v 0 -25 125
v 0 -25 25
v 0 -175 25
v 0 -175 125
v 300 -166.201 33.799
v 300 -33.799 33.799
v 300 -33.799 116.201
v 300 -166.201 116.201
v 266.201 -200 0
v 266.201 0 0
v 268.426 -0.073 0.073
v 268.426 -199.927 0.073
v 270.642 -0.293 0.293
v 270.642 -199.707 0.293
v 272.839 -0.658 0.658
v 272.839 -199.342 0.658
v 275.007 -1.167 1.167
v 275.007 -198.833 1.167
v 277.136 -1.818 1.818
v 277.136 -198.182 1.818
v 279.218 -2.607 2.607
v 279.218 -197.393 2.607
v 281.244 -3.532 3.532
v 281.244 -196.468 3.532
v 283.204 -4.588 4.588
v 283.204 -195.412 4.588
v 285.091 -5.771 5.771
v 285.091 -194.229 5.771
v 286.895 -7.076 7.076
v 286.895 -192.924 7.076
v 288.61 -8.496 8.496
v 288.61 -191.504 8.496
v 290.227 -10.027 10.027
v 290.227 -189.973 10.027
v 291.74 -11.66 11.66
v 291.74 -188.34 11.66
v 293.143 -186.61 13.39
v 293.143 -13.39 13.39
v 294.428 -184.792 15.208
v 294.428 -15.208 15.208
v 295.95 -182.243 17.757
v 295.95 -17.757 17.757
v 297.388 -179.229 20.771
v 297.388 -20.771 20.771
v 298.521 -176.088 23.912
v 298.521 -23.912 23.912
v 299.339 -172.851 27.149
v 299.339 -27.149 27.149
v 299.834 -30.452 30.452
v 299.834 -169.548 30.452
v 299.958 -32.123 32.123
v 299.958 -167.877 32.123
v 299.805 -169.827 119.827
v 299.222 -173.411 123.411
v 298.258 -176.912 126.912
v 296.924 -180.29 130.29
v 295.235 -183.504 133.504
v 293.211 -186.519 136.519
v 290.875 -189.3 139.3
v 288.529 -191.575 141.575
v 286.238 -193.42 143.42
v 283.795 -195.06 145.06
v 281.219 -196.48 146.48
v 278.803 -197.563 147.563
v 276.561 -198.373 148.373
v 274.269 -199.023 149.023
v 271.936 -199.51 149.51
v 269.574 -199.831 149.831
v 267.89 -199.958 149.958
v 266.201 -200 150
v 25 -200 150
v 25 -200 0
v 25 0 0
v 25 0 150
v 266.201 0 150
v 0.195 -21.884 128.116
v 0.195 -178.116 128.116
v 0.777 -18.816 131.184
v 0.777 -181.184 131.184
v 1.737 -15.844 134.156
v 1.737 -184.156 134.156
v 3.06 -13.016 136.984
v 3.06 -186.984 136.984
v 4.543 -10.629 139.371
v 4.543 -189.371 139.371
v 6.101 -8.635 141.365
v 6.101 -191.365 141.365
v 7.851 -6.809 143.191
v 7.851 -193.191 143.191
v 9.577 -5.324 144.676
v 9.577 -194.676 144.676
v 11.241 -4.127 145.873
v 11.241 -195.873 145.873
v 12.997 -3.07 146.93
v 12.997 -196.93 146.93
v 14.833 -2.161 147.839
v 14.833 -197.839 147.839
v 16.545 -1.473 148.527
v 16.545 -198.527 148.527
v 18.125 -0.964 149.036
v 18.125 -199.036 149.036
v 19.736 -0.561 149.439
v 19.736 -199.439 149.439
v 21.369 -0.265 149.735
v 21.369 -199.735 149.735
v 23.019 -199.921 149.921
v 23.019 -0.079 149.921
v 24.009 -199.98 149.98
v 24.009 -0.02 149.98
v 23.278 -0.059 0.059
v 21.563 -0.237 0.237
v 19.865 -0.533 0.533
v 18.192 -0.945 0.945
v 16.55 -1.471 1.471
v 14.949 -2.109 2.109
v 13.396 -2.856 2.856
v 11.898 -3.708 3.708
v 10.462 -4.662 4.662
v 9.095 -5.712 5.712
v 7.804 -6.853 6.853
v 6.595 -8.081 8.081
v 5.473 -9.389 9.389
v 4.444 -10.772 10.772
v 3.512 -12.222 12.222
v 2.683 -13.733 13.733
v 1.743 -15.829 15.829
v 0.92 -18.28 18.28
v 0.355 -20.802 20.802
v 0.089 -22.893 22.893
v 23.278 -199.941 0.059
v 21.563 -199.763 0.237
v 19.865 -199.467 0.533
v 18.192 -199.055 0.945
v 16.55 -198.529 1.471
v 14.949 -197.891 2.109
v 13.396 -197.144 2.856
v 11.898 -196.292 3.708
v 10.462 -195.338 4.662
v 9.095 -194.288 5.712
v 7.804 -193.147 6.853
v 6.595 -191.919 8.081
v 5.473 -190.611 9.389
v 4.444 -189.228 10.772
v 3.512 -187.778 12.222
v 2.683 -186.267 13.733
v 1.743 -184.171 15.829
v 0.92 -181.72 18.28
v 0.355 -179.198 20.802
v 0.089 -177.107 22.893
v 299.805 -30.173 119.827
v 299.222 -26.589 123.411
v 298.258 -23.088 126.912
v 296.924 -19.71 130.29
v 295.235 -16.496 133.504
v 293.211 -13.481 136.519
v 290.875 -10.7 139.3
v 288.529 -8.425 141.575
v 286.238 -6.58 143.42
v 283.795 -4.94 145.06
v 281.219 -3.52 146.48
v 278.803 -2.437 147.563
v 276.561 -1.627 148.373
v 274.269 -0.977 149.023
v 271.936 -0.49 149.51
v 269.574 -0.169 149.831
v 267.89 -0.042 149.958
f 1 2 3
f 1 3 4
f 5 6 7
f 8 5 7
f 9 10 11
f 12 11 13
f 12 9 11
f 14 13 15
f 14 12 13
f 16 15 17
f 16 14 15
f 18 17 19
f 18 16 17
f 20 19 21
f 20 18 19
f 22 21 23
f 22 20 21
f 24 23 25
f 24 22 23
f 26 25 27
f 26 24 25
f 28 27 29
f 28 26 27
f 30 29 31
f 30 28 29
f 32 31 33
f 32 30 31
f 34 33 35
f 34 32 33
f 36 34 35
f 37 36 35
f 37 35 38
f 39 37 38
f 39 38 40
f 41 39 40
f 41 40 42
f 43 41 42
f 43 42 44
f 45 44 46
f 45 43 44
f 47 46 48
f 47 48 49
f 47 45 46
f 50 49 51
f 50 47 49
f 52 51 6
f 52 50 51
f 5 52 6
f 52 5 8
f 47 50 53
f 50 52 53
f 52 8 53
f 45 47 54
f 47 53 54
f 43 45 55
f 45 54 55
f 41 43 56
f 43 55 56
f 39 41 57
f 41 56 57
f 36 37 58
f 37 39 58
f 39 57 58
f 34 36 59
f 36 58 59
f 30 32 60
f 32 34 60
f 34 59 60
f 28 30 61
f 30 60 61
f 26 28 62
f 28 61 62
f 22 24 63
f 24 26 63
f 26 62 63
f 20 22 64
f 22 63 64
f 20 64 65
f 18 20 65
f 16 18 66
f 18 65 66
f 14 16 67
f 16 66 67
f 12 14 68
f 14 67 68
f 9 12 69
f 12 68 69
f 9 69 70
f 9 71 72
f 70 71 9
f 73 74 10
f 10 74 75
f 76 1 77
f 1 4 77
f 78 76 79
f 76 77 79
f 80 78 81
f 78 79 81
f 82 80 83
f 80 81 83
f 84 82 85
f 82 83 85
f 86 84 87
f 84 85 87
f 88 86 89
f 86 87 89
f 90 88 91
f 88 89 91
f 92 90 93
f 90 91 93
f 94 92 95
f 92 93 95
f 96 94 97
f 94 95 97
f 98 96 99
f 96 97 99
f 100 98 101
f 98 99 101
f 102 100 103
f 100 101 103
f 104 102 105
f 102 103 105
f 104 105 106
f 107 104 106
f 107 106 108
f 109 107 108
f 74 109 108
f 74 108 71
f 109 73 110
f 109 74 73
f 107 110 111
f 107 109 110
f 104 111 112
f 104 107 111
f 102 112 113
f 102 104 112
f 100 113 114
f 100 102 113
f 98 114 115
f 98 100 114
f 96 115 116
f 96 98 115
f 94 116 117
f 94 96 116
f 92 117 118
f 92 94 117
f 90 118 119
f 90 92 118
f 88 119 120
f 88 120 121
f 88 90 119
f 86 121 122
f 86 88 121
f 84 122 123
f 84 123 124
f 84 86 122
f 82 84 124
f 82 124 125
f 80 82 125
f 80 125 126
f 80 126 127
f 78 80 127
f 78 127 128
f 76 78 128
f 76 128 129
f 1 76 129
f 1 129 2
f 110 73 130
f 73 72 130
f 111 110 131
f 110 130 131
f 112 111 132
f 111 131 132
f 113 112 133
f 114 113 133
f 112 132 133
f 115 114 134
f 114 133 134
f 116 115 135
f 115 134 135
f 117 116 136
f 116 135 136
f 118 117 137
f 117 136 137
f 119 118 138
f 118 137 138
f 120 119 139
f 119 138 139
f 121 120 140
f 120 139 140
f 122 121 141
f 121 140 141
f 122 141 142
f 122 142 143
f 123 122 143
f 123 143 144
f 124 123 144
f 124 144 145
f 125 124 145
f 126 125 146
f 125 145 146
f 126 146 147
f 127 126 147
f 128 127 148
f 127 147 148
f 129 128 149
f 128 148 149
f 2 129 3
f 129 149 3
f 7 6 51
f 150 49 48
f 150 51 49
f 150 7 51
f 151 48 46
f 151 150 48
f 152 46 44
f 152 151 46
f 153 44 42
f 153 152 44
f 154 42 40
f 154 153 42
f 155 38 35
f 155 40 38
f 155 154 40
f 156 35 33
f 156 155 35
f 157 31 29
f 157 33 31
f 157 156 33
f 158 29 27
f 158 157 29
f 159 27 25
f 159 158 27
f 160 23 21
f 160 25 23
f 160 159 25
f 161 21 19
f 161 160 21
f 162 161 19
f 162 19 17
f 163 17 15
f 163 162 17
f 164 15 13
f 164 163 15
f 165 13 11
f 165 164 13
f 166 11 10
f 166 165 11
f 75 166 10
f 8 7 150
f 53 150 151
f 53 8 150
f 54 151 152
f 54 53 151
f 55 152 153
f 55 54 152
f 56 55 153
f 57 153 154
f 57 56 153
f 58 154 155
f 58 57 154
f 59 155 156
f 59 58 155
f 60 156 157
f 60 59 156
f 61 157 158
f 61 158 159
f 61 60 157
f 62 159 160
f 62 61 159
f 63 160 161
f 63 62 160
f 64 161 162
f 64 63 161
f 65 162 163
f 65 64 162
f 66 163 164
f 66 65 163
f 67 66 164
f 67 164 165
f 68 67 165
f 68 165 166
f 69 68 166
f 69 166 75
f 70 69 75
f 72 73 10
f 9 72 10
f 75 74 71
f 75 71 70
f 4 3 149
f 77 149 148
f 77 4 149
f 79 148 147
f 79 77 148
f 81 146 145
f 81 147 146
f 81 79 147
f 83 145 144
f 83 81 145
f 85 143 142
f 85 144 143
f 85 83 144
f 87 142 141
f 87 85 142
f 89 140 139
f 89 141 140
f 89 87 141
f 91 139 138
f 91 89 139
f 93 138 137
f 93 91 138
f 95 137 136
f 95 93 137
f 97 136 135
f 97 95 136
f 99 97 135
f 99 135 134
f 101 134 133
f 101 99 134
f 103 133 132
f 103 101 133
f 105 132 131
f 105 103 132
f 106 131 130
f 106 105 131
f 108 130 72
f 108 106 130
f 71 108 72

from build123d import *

# Parameters (mm, degrees)
F0_W     = 300
F0_H     = 150
F1_DEPTH = 200
F3_R     = 33.79899
F4_R     = 25


with BuildPart() as f1:
    # F0 (on Front) → F1 (new body)
    with BuildSketch(Plane.XZ):
        with Locations((150, 75)):
            Rectangle(F0_W, F0_H)
    extrude(amount=F1_DEPTH)

    # F3
    f3_edges = [f1.edges().sort_by_distance(p)[0] for p in [
        (300, -100, 150),
        (300, -100, 0),
        (300, 0, 75),
        (300, -200, 75),
    ]]
    fillet(f3_edges, radius=F3_R)

    # F4
    f4_edges = [f1.edges().sort_by_distance(p)[0] for p in [
        (0, -100, 150),
        (0, -100, 0),
        (0, 0, 75),
        (0, -200, 75),
    ]]
    fillet(f4_edges, radius=F4_R)


solid = f1.part
